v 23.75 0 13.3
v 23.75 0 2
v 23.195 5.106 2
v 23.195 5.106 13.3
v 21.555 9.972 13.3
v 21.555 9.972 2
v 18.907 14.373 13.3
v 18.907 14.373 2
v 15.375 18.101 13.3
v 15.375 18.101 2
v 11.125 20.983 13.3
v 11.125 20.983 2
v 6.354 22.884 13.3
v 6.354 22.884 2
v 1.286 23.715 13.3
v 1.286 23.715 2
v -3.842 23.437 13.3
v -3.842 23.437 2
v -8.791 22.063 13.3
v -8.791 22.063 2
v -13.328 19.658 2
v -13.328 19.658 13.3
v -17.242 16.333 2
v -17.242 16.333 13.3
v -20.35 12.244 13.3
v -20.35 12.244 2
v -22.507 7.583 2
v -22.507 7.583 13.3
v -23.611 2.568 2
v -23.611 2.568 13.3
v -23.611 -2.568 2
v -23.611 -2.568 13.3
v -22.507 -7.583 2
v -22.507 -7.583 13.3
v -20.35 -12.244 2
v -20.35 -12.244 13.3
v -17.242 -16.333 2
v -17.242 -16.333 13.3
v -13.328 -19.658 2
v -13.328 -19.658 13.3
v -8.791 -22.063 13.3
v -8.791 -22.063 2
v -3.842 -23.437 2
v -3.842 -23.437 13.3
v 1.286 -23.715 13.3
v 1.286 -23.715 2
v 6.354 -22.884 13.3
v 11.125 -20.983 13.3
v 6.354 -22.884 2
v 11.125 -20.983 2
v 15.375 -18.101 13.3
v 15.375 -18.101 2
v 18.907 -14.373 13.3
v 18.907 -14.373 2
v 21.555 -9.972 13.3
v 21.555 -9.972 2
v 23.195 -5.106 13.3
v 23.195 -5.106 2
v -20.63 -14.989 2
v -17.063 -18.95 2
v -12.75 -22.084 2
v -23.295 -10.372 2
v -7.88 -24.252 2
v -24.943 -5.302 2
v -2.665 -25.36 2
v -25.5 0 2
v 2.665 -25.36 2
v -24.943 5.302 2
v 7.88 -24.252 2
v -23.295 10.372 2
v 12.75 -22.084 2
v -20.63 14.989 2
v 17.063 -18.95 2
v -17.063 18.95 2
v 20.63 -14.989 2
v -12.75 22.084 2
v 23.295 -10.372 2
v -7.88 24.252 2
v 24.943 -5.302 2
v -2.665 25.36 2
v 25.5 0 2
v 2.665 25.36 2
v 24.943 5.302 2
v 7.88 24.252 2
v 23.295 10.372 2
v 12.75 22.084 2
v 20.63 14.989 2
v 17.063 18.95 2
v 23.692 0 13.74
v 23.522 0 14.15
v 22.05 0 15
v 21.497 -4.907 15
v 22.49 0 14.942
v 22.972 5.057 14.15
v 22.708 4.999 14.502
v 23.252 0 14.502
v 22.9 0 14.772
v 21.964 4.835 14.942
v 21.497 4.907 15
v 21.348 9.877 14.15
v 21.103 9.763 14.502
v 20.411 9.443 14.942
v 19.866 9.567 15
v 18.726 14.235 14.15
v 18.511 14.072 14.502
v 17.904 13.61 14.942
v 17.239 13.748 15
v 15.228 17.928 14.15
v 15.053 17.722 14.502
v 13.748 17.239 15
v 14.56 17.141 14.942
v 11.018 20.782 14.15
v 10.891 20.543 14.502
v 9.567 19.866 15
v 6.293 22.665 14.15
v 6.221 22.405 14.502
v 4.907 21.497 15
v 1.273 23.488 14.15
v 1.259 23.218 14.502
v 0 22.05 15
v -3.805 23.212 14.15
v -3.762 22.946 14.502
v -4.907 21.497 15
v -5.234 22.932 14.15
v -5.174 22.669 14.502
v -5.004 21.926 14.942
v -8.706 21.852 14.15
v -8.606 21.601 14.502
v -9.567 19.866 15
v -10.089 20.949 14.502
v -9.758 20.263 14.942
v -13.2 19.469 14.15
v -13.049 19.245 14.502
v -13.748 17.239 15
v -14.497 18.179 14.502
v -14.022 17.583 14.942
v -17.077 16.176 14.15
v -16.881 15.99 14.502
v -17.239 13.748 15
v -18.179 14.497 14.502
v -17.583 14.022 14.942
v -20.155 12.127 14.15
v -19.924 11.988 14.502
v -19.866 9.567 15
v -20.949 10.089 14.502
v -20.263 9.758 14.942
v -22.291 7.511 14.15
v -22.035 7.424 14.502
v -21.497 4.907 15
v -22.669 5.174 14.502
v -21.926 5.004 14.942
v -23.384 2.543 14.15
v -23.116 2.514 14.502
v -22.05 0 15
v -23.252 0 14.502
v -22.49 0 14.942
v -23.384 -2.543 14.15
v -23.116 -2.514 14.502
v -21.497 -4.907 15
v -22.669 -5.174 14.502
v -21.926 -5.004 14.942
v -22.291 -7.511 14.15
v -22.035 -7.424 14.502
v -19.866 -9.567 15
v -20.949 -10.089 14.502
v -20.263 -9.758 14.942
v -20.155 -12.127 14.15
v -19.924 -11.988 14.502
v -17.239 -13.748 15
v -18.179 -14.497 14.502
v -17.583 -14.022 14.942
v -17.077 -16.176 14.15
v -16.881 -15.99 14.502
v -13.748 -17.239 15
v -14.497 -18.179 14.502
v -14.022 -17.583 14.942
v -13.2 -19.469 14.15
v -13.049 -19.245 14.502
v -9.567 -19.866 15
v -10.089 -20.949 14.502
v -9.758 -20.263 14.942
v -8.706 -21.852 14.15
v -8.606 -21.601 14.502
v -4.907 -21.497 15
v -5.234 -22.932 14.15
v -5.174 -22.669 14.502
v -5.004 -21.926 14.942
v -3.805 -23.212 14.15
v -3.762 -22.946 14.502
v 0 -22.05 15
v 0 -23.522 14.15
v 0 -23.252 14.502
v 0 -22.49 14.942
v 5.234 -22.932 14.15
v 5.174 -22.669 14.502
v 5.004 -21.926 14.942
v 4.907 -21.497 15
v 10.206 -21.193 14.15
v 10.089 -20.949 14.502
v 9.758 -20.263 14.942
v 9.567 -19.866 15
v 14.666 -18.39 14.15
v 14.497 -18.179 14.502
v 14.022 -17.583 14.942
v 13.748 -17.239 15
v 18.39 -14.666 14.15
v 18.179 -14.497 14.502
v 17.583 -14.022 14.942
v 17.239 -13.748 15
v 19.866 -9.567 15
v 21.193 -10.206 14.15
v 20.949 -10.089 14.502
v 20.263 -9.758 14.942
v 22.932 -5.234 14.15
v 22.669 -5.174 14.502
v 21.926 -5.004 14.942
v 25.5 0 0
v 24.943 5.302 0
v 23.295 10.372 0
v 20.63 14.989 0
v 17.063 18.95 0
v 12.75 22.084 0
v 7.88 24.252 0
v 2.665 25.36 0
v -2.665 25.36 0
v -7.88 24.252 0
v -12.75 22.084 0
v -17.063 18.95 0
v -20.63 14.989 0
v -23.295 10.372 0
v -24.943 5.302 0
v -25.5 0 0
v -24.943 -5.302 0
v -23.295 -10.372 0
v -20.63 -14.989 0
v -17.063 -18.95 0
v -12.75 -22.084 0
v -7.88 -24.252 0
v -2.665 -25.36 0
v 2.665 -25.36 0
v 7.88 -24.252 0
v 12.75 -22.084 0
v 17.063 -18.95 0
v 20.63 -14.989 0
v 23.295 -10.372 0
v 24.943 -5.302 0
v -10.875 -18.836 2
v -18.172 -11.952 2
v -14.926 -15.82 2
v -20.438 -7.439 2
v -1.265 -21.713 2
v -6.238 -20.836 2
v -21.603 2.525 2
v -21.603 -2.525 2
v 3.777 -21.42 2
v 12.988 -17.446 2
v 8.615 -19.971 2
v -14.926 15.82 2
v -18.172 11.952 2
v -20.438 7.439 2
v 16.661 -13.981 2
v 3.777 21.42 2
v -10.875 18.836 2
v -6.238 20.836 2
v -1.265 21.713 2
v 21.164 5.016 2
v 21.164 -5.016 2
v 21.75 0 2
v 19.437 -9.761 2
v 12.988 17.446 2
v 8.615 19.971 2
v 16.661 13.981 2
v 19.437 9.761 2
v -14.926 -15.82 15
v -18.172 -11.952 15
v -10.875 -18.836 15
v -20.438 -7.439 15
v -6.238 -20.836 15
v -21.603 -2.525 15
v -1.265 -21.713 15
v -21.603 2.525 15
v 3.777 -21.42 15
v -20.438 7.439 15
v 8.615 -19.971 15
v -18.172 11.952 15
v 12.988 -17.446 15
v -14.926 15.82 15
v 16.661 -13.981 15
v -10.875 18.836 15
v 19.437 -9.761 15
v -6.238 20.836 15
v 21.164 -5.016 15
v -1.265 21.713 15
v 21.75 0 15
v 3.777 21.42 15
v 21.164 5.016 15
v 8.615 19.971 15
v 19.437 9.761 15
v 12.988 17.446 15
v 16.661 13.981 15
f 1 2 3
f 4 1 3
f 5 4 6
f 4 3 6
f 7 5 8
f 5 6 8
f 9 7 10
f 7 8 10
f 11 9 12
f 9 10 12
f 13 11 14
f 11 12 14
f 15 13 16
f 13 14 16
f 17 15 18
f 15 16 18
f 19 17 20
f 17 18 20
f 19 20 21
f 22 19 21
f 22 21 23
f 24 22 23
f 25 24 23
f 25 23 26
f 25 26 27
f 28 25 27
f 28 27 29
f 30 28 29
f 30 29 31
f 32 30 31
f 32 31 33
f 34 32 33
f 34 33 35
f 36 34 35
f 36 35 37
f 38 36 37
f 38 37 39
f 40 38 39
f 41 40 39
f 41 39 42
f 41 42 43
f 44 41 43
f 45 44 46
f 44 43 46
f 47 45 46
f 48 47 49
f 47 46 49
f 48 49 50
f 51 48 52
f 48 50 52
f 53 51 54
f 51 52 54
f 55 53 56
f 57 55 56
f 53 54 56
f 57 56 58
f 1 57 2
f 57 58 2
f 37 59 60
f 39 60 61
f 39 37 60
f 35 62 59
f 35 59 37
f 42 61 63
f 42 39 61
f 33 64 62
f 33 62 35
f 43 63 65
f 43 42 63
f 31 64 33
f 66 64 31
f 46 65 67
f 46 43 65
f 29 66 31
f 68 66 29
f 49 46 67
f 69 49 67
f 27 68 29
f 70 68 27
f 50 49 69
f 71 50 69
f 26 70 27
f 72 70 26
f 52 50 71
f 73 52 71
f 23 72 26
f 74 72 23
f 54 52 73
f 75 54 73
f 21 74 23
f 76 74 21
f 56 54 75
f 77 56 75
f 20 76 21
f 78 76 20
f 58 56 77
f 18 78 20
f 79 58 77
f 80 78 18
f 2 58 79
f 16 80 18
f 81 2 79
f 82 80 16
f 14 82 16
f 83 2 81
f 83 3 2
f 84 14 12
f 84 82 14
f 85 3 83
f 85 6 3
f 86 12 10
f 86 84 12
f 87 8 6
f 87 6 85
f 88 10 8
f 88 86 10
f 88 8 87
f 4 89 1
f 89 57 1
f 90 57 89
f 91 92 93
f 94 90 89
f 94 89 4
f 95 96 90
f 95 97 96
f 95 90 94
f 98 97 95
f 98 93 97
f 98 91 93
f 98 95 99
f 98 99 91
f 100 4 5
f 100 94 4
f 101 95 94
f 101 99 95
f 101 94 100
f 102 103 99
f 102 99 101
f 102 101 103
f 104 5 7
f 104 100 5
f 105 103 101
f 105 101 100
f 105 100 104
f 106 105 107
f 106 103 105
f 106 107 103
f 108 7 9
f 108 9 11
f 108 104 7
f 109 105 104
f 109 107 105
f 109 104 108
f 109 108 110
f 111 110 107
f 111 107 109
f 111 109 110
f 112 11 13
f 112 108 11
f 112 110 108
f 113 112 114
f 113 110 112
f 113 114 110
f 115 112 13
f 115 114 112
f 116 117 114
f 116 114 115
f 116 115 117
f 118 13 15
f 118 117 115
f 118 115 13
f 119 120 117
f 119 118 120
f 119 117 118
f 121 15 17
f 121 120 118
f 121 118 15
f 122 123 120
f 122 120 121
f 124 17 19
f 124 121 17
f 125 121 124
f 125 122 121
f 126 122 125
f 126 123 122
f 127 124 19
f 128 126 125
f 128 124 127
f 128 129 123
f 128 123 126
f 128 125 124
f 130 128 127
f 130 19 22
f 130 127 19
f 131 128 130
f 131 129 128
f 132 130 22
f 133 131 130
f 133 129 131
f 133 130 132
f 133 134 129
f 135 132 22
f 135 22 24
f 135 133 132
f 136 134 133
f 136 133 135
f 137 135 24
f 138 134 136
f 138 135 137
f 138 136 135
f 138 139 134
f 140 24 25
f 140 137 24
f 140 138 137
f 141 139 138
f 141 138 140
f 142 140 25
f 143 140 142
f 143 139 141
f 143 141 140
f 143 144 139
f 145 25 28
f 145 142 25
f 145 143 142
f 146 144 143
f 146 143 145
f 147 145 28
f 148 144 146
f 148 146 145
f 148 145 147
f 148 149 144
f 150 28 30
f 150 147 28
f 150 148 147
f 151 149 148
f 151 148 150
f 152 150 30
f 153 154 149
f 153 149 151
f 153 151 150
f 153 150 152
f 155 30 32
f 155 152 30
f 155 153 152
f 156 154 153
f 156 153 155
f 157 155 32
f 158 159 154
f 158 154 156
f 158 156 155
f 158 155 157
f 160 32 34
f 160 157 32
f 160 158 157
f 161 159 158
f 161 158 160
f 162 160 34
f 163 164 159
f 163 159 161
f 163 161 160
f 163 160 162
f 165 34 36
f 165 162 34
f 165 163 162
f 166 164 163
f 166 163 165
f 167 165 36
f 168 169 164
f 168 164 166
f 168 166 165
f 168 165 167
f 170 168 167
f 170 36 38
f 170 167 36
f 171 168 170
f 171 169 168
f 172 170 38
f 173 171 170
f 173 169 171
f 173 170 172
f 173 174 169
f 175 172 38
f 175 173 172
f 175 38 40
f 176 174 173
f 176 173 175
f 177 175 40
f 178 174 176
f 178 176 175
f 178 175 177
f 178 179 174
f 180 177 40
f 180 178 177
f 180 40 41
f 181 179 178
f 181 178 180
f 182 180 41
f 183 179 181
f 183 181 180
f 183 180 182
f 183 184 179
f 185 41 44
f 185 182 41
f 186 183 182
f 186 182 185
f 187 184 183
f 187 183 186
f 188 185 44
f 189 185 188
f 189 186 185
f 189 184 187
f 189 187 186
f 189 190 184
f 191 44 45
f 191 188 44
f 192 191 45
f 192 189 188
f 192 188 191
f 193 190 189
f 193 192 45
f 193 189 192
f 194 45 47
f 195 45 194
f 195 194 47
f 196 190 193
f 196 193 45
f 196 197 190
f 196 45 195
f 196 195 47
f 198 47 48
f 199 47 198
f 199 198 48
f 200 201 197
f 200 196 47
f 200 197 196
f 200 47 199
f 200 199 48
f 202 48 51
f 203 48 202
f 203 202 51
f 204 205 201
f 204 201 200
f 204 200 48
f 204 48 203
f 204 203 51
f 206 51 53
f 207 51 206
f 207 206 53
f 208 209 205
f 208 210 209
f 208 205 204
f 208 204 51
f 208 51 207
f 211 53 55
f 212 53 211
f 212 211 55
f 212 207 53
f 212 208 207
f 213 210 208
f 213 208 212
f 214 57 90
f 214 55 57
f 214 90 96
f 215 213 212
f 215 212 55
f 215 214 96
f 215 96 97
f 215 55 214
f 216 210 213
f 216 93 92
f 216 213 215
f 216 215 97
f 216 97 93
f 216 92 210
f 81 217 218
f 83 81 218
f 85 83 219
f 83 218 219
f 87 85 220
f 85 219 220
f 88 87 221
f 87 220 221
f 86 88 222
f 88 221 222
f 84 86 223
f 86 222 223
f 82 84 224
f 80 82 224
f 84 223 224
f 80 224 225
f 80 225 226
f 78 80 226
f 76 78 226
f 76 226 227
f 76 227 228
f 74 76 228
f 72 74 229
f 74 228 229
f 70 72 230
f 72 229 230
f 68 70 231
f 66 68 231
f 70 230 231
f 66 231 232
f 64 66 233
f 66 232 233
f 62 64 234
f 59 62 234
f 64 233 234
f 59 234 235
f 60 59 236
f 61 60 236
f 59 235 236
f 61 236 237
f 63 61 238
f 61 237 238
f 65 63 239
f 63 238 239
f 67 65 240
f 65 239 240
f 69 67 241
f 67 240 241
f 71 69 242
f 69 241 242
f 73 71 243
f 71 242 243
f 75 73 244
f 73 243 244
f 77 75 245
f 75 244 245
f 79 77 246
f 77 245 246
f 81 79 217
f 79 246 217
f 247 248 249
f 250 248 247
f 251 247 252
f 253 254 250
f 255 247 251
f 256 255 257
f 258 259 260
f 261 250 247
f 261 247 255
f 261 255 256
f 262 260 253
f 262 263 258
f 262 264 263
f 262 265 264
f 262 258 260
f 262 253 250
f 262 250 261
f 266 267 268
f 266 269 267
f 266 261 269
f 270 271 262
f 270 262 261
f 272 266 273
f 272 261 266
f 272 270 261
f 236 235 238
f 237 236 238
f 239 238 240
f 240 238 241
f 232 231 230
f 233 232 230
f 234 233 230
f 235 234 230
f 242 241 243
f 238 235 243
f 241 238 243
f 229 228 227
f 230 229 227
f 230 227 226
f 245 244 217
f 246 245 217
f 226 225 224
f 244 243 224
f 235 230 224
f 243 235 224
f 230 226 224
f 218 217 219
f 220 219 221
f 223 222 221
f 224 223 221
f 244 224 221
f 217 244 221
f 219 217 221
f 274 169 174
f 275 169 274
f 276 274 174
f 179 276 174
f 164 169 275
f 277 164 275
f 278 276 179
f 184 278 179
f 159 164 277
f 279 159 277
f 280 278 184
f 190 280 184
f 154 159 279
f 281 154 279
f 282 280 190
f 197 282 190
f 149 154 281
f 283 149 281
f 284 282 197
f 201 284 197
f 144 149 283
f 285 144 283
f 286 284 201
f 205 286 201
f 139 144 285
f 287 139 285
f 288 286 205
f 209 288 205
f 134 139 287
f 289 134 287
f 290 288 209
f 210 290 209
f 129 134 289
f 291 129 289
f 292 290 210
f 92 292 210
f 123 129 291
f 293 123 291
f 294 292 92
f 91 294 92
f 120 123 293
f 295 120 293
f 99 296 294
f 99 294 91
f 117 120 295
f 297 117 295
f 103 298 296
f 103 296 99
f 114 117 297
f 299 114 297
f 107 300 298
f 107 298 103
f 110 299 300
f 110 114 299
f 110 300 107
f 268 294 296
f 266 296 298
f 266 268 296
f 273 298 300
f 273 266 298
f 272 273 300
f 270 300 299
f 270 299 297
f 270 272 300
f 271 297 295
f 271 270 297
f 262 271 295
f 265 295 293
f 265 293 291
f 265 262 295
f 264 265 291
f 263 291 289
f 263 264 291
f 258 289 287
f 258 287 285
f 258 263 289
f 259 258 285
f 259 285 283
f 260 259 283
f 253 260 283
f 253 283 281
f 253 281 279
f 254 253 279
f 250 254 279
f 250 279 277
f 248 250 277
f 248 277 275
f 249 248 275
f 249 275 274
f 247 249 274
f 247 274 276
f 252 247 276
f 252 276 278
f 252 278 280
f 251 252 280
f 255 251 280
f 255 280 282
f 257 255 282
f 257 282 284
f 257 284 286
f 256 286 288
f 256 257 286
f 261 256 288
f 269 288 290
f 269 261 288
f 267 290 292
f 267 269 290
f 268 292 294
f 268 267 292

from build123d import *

# Parameters (mm, degrees)
F0_R     = 25.5
F0_R_2   = 23.75
F0_R_3   = 21.75
F1_DEPTH = 2
F2_DEPTH = 15
F3_R     = 1.7


with BuildPart() as f1:
    # F0 (on Top) → F1 (new body)
    with BuildSketch(Plane.XY):
        Circle(F0_R)
        Circle(F0_R_2, mode=Mode.SUBTRACT)
        Circle(F0_R_2)
        Circle(F0_R_3, mode=Mode.SUBTRACT)
        Circle(F0_R_3)
    extrude(amount=F1_DEPTH)

    # F0 (on Top) → F2 (join)
    with BuildSketch(Plane.XY):
        Circle(F0_R_2)
        Circle(F0_R_3, mode=Mode.SUBTRACT)
    extrude(amount=F2_DEPTH)

    # F3
    f3_edges = [f1.edges().sort_by_distance(p)[0] for p in [
        (-23.75, 0, 15),
    ]]
    fillet(f3_edges, radius=F3_R)


solid = f1.part
